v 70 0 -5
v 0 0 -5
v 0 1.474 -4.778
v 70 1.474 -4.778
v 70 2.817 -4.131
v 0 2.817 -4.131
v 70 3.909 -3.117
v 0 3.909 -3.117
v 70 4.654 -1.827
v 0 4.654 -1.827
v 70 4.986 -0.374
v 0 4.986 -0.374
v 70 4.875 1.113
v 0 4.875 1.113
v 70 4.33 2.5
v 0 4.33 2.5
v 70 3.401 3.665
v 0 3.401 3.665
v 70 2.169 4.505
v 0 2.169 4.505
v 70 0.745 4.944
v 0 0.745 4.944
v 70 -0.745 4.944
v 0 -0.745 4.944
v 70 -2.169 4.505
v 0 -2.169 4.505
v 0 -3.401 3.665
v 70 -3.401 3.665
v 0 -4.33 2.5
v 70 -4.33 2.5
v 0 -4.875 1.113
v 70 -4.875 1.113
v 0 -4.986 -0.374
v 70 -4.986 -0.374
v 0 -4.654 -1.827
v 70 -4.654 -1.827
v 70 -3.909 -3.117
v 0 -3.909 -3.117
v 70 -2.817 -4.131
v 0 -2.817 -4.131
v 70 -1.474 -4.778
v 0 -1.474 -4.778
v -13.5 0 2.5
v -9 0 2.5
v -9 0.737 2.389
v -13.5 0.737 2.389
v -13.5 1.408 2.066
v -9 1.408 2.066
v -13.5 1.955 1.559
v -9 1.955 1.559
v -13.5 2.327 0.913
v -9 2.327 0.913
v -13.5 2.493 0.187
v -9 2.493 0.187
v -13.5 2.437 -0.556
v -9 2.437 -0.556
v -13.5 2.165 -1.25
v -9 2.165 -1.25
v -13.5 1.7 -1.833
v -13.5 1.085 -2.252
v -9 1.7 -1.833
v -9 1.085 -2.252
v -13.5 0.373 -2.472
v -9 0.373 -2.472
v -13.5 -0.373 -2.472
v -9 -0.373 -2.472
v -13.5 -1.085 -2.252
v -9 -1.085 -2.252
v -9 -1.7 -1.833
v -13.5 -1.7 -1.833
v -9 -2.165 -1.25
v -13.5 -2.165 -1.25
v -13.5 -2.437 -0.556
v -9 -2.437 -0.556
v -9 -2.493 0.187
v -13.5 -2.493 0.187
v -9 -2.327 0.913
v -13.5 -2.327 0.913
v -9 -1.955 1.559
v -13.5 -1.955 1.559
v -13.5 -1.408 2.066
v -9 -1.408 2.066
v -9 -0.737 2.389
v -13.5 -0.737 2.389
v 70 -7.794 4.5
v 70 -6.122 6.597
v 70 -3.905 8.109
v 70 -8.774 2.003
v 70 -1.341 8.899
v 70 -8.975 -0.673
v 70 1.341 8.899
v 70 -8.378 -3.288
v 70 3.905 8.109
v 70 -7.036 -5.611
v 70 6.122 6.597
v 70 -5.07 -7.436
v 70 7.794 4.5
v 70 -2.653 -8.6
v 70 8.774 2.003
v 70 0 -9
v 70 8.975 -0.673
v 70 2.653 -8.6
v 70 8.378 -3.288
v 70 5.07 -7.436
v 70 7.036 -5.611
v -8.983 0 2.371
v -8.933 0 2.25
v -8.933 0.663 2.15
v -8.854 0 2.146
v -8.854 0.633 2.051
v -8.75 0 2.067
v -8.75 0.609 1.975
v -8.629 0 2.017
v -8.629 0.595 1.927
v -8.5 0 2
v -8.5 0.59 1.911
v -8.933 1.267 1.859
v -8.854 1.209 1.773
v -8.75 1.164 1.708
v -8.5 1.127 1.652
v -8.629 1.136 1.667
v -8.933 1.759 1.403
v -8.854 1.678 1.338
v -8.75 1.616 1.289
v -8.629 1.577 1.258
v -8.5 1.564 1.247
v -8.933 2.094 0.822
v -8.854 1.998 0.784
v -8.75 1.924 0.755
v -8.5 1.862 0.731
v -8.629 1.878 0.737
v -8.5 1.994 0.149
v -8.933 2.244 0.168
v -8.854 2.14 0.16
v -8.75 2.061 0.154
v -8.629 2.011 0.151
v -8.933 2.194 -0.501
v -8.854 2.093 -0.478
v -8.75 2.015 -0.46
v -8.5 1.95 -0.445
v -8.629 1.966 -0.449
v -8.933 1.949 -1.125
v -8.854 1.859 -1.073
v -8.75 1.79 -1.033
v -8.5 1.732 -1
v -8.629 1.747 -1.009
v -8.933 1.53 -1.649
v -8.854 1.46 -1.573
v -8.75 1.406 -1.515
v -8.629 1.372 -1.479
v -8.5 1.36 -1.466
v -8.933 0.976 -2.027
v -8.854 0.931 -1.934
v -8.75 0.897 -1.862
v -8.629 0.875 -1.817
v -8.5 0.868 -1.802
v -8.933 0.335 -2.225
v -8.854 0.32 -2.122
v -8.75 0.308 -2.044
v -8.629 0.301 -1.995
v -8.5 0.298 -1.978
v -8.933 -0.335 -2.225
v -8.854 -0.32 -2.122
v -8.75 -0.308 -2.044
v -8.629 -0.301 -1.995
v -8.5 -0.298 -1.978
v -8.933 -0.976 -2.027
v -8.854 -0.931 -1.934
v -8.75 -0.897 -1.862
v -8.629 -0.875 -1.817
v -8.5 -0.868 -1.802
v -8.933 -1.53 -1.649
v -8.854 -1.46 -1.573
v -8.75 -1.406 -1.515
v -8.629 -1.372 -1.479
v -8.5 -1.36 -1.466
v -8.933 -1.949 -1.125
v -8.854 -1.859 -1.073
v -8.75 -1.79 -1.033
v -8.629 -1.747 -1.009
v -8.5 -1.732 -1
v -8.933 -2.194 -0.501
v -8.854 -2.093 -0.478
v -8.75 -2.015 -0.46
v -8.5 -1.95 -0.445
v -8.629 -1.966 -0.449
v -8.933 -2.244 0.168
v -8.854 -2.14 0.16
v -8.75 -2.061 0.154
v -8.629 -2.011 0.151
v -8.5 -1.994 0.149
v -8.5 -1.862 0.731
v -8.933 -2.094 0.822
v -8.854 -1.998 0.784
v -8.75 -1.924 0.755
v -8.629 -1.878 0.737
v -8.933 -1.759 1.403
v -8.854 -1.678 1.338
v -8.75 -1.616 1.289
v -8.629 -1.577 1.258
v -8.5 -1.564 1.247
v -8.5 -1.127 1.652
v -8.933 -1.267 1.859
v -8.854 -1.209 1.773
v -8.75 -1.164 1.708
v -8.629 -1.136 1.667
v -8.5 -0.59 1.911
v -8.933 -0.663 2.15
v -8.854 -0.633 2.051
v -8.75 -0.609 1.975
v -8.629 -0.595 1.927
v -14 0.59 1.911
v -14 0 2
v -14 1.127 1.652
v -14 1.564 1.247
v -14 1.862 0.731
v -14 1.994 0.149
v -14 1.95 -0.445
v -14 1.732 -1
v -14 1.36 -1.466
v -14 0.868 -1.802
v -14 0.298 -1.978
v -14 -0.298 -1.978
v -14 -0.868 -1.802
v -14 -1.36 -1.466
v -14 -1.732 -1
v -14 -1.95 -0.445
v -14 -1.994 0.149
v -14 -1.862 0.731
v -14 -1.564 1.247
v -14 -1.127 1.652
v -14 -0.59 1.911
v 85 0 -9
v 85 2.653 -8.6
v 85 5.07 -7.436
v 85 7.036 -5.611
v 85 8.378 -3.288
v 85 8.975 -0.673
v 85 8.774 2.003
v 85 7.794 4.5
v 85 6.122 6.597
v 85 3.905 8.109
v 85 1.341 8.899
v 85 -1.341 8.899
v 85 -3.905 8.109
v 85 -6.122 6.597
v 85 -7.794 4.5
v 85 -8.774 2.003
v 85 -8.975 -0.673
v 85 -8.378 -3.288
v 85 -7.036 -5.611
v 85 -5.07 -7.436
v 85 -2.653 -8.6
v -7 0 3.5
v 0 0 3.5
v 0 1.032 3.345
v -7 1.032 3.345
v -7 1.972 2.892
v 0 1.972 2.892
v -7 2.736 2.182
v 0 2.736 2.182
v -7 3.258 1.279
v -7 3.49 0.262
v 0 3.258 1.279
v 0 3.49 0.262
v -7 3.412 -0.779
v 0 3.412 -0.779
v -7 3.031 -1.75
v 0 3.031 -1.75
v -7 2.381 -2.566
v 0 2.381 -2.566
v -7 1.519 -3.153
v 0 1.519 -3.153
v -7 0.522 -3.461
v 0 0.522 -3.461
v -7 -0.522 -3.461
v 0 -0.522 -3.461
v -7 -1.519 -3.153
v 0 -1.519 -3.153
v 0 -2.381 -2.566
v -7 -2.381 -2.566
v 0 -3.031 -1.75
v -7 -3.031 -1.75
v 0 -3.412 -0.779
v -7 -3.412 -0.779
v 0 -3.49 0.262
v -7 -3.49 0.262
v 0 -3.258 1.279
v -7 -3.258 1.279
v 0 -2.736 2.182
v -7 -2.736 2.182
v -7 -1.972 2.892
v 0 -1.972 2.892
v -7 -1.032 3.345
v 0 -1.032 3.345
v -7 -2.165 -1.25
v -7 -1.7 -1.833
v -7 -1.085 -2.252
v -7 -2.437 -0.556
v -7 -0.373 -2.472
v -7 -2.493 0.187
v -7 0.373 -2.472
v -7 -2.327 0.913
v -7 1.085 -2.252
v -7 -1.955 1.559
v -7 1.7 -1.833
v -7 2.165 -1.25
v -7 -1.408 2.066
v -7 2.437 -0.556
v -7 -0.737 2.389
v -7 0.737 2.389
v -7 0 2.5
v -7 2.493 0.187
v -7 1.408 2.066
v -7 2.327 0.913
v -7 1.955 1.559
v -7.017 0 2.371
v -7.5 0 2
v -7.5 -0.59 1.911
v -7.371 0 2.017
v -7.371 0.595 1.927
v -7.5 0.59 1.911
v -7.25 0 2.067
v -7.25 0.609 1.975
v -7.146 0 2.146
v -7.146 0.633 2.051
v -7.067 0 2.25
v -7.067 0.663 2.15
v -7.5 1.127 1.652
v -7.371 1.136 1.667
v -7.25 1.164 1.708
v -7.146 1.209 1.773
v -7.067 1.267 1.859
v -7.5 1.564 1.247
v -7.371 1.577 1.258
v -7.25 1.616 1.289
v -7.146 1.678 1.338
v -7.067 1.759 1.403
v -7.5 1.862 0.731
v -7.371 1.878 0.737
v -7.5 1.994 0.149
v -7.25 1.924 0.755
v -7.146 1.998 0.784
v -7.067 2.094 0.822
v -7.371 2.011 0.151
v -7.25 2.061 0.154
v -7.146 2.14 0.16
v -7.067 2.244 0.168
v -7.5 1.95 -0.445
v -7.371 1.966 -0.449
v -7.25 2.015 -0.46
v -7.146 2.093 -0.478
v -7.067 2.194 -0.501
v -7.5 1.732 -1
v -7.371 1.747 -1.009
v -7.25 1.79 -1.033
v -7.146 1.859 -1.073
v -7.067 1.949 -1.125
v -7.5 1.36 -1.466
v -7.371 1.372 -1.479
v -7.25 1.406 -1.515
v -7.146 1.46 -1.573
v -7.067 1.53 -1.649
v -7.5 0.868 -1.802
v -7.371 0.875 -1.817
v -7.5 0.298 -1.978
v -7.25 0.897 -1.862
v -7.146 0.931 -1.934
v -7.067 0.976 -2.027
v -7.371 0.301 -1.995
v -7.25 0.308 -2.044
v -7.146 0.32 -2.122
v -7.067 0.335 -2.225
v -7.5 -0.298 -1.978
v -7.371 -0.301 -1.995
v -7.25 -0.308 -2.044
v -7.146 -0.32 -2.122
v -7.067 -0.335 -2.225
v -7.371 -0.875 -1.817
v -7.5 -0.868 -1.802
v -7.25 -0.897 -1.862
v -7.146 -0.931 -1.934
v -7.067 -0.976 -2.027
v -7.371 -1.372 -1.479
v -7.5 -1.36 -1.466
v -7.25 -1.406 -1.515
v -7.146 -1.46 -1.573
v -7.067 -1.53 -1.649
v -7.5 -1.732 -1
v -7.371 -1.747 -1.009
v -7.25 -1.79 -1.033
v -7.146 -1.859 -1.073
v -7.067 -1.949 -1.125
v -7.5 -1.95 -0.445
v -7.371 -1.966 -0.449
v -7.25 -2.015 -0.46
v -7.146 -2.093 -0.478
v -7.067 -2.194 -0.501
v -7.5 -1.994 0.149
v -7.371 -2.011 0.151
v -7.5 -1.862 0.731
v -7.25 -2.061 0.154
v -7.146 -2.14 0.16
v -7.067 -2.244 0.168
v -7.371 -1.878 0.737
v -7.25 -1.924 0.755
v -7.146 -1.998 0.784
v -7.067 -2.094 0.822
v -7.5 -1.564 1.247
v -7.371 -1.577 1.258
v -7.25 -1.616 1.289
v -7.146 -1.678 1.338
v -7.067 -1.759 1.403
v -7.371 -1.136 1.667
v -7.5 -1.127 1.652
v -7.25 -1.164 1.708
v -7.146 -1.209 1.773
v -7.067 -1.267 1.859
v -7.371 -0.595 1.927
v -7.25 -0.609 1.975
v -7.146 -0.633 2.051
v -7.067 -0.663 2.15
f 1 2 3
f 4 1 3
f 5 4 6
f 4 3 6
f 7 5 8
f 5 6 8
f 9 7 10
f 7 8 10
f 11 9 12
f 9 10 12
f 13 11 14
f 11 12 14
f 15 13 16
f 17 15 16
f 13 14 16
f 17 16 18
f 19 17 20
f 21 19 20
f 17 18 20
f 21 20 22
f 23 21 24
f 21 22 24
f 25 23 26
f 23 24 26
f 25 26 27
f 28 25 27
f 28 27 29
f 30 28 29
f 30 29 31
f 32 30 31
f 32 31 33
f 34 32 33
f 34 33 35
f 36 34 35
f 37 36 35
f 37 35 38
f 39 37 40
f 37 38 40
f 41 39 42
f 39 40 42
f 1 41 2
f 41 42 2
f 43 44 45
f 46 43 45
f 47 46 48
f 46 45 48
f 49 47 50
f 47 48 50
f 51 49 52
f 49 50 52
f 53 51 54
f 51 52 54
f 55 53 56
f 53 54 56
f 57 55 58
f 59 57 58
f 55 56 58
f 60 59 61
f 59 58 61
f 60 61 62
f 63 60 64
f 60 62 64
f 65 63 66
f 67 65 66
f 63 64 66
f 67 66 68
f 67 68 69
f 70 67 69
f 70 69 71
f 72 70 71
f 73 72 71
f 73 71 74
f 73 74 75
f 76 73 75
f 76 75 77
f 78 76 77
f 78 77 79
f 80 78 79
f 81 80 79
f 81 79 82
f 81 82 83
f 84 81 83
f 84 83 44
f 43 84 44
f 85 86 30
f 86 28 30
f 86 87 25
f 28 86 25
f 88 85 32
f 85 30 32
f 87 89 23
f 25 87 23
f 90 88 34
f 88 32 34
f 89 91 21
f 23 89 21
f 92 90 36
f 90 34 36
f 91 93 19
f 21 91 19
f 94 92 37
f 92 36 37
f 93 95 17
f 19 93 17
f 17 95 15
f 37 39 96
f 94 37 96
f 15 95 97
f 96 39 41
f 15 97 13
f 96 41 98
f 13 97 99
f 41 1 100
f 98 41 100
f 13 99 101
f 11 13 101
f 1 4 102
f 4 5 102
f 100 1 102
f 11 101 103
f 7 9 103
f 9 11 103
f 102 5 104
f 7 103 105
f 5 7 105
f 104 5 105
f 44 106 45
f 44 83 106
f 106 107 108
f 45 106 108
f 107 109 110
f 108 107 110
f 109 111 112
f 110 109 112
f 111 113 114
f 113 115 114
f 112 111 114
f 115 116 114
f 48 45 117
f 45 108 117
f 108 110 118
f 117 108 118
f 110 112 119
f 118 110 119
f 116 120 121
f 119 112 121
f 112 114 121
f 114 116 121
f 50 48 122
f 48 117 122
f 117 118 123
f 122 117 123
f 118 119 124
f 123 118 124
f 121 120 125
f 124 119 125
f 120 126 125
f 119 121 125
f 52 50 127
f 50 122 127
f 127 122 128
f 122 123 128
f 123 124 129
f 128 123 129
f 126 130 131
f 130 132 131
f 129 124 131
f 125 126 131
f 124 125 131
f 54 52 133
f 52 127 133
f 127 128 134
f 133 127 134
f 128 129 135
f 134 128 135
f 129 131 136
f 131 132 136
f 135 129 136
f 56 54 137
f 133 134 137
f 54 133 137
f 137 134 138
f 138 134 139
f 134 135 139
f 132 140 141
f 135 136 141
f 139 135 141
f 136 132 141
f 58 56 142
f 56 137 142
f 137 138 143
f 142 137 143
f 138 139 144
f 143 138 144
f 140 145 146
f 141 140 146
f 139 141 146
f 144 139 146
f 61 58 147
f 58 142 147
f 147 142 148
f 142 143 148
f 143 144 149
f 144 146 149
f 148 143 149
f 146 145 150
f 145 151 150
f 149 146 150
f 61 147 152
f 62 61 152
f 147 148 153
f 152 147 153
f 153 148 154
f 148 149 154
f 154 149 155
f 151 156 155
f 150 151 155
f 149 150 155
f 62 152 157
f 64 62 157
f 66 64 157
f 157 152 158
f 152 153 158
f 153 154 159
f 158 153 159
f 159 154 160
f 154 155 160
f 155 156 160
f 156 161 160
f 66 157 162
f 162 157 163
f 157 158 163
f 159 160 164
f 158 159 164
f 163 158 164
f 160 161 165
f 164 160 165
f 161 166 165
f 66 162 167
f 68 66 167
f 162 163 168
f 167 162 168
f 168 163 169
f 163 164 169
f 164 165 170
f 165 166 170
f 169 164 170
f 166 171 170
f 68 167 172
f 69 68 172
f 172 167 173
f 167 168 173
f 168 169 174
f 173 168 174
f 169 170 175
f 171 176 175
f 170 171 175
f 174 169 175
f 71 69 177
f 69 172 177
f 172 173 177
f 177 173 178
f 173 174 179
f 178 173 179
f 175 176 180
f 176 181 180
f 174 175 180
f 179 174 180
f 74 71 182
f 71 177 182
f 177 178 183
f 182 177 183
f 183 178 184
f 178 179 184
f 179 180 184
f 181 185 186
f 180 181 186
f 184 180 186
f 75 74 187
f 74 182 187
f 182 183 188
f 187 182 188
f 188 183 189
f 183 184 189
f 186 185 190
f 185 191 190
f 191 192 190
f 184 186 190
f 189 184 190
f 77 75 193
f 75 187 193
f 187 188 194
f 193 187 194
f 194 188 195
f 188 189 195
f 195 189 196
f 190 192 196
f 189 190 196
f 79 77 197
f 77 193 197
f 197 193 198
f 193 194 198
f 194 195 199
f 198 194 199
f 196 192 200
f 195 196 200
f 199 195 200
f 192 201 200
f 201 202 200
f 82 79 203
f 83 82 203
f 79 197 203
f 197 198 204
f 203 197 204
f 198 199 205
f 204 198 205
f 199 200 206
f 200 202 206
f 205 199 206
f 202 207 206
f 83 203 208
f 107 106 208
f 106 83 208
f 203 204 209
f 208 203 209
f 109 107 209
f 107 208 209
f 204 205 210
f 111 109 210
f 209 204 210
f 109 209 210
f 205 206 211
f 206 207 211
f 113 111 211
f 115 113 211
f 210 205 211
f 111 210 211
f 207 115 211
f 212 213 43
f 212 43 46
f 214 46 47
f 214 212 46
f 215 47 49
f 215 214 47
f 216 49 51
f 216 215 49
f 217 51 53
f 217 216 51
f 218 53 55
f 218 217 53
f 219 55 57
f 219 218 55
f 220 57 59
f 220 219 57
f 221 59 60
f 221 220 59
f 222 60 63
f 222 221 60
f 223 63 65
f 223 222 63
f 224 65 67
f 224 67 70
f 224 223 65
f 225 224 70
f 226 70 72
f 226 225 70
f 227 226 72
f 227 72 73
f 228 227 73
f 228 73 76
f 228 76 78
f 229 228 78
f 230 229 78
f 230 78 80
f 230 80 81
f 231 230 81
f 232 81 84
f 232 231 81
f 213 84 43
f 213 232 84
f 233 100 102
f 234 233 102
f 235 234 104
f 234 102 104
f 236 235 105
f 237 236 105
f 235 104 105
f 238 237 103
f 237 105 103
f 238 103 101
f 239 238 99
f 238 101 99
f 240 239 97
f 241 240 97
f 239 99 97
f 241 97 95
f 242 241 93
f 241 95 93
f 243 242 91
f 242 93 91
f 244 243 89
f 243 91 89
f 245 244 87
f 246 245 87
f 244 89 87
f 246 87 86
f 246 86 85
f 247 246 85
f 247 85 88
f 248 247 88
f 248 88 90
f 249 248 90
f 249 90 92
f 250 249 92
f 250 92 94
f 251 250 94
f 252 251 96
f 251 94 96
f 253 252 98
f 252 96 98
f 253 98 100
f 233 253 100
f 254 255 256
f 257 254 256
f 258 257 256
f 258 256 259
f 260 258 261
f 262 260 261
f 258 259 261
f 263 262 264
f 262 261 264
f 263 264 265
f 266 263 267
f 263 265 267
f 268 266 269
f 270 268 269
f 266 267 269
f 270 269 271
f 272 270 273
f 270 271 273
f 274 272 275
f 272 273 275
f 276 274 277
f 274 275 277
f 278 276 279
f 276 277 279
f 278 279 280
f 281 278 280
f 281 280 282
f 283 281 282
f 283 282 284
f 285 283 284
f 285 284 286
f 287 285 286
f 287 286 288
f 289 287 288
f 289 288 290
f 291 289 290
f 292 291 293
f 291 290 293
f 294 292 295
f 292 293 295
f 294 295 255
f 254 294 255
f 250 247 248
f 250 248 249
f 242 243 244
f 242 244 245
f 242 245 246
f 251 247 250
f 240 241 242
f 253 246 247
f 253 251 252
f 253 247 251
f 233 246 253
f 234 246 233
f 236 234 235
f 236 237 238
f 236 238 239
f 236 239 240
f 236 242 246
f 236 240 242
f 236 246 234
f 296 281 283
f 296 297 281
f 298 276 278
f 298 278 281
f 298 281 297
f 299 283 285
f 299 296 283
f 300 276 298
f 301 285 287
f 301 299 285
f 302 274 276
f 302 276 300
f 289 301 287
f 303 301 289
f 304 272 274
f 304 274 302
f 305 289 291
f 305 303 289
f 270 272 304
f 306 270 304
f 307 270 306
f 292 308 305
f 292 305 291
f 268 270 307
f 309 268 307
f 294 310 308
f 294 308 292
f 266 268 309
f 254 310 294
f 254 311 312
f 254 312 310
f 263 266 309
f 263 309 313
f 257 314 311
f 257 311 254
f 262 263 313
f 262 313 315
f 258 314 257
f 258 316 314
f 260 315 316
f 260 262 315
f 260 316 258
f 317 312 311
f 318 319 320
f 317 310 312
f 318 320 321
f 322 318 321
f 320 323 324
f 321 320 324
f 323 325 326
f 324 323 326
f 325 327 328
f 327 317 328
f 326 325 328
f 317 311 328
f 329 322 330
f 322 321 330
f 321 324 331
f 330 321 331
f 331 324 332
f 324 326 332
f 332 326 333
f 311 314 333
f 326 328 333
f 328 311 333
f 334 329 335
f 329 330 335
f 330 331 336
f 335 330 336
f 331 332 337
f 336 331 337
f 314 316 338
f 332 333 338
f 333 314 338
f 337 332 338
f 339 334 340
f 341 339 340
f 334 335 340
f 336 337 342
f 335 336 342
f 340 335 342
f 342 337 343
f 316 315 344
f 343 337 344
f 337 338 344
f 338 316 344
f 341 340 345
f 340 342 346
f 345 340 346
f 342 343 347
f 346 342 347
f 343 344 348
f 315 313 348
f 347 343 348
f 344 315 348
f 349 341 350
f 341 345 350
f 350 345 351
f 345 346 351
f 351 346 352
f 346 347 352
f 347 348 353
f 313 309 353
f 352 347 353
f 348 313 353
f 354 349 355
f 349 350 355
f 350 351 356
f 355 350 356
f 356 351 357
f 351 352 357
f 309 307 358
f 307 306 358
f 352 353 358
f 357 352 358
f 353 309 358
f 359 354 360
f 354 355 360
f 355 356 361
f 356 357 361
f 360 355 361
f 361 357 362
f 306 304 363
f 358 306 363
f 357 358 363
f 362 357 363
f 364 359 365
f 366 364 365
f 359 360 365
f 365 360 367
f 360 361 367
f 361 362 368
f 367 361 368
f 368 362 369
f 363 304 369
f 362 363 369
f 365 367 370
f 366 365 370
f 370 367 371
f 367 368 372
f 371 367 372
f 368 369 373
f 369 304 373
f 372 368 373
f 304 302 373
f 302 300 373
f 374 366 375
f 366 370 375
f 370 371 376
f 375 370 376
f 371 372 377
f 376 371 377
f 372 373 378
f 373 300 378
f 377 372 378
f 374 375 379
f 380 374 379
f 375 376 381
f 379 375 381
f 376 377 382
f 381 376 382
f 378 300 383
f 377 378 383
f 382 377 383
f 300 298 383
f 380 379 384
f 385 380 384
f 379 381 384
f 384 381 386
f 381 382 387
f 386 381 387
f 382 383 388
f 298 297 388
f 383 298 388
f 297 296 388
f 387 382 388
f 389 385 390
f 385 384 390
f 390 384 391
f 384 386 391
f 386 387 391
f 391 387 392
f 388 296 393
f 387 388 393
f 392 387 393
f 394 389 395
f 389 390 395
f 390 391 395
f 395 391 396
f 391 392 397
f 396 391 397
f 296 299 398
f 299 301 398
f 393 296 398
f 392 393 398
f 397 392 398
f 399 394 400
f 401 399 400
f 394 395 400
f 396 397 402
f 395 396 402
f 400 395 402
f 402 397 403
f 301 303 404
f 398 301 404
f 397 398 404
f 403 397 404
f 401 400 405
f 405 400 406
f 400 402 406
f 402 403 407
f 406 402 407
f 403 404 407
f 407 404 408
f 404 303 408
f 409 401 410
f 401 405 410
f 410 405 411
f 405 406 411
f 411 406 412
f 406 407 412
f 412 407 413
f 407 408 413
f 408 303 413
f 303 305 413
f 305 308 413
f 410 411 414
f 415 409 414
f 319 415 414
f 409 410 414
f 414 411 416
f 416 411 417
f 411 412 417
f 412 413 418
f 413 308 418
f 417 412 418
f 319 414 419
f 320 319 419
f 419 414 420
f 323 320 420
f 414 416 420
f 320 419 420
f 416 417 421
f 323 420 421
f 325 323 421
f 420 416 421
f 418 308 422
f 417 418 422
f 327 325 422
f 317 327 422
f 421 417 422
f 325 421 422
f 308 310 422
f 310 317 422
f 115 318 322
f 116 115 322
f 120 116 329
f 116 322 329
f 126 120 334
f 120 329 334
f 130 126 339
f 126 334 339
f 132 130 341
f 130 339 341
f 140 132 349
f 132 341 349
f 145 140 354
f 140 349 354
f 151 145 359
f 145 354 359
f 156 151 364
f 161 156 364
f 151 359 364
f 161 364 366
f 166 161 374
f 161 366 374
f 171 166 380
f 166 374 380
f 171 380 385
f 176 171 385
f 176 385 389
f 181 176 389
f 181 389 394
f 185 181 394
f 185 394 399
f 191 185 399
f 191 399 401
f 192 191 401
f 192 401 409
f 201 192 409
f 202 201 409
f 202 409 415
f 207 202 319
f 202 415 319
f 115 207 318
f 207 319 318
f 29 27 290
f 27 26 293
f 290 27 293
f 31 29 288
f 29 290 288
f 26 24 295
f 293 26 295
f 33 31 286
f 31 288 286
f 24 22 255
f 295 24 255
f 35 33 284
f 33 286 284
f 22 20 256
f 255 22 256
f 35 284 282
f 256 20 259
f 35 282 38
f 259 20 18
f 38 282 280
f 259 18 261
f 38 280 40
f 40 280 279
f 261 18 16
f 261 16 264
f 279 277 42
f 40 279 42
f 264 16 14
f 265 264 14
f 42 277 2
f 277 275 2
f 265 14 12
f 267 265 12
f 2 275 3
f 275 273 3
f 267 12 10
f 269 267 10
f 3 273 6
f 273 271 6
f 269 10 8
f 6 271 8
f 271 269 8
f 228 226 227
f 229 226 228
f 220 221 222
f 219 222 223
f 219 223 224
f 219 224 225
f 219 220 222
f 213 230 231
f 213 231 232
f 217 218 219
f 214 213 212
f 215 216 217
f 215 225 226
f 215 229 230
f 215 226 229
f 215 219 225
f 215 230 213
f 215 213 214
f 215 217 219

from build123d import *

# Parameters (mm, degrees)
SKETCH1_R           = 5
BOSS_EXTRUDE1_DEPTH = 70
SKETCH3_R           = 3.5
BOSS_EXTRUDE2_DEPTH = 7
SKETCH4_R           = 2.5
BOSS_EXTRUDE3_DEPTH = 7
SKETCH7_OUTSIDE_W   = 29.036
SKETCH7_OUTSIDE_H   = 29.036
SKETCH7_OUTSIDE_R   = 2
CUT_EXTRUDE5_DEPTH  = 2
CHAMFER1_SIZE       = 0.5
FILLET1_R           = 0.5
SKETCH8_R           = 9
BOSS_EXTRUDE4_DEPTH = 15


with BuildPart() as part:
    # Sketch1 → Boss-Extrude1 (new body)
    with BuildSketch(Plane(origin=(0, 0, 0), x_dir=(0, 0, -1), z_dir=(1, 0, 0))):
        Circle(SKETCH1_R)
    extrude(amount=BOSS_EXTRUDE1_DEPTH)

    # Sketch3 → Boss-Extrude2 (add)
    with BuildSketch(Plane.ZY):
        Circle(SKETCH3_R)
    extrude(amount=BOSS_EXTRUDE2_DEPTH)

    # Sketch4 → Boss-Extrude3 (add)
    with BuildSketch(Plane.ZY.offset(7)):
        Circle(SKETCH4_R)
    extrude(amount=BOSS_EXTRUDE3_DEPTH)

    # Sketch7 outside → Cut-Extrude5 (cut)
    with BuildSketch(Plane.ZY.offset(7)):
        Rectangle(SKETCH7_OUTSIDE_W, SKETCH7_OUTSIDE_H)
        Circle(SKETCH7_OUTSIDE_R, mode=Mode.SUBTRACT)
    extrude(amount=CUT_EXTRUDE5_DEPTH, mode=Mode.SUBTRACT)

    # Chamfer1
    chamfer1_edges = [part.edges().sort_by_distance(p)[0] for p in [
        (-14, 0, -2.5),
    ]]
    chamfer(chamfer1_edges, length=CHAMFER1_SIZE)

    # Fillet1
    fillet1_edges = [part.edges().sort_by_distance(p)[0] for p in [
        (-7, 0, -2),
        (-9, 0, -2),
    ]]
    fillet(fillet1_edges, radius=FILLET1_R - 0.0001)  # a hair under: the kernel refuses the full size

    # Sketch8 → Boss-Extrude4 (add)
    with BuildSketch(Plane(origin=(70, 0, 0), x_dir=(0, 0, -1), z_dir=(1, 0, 0))):
        Circle(SKETCH8_R)
    extrude(amount=BOSS_EXTRUDE4_DEPTH)


solid = part.part
